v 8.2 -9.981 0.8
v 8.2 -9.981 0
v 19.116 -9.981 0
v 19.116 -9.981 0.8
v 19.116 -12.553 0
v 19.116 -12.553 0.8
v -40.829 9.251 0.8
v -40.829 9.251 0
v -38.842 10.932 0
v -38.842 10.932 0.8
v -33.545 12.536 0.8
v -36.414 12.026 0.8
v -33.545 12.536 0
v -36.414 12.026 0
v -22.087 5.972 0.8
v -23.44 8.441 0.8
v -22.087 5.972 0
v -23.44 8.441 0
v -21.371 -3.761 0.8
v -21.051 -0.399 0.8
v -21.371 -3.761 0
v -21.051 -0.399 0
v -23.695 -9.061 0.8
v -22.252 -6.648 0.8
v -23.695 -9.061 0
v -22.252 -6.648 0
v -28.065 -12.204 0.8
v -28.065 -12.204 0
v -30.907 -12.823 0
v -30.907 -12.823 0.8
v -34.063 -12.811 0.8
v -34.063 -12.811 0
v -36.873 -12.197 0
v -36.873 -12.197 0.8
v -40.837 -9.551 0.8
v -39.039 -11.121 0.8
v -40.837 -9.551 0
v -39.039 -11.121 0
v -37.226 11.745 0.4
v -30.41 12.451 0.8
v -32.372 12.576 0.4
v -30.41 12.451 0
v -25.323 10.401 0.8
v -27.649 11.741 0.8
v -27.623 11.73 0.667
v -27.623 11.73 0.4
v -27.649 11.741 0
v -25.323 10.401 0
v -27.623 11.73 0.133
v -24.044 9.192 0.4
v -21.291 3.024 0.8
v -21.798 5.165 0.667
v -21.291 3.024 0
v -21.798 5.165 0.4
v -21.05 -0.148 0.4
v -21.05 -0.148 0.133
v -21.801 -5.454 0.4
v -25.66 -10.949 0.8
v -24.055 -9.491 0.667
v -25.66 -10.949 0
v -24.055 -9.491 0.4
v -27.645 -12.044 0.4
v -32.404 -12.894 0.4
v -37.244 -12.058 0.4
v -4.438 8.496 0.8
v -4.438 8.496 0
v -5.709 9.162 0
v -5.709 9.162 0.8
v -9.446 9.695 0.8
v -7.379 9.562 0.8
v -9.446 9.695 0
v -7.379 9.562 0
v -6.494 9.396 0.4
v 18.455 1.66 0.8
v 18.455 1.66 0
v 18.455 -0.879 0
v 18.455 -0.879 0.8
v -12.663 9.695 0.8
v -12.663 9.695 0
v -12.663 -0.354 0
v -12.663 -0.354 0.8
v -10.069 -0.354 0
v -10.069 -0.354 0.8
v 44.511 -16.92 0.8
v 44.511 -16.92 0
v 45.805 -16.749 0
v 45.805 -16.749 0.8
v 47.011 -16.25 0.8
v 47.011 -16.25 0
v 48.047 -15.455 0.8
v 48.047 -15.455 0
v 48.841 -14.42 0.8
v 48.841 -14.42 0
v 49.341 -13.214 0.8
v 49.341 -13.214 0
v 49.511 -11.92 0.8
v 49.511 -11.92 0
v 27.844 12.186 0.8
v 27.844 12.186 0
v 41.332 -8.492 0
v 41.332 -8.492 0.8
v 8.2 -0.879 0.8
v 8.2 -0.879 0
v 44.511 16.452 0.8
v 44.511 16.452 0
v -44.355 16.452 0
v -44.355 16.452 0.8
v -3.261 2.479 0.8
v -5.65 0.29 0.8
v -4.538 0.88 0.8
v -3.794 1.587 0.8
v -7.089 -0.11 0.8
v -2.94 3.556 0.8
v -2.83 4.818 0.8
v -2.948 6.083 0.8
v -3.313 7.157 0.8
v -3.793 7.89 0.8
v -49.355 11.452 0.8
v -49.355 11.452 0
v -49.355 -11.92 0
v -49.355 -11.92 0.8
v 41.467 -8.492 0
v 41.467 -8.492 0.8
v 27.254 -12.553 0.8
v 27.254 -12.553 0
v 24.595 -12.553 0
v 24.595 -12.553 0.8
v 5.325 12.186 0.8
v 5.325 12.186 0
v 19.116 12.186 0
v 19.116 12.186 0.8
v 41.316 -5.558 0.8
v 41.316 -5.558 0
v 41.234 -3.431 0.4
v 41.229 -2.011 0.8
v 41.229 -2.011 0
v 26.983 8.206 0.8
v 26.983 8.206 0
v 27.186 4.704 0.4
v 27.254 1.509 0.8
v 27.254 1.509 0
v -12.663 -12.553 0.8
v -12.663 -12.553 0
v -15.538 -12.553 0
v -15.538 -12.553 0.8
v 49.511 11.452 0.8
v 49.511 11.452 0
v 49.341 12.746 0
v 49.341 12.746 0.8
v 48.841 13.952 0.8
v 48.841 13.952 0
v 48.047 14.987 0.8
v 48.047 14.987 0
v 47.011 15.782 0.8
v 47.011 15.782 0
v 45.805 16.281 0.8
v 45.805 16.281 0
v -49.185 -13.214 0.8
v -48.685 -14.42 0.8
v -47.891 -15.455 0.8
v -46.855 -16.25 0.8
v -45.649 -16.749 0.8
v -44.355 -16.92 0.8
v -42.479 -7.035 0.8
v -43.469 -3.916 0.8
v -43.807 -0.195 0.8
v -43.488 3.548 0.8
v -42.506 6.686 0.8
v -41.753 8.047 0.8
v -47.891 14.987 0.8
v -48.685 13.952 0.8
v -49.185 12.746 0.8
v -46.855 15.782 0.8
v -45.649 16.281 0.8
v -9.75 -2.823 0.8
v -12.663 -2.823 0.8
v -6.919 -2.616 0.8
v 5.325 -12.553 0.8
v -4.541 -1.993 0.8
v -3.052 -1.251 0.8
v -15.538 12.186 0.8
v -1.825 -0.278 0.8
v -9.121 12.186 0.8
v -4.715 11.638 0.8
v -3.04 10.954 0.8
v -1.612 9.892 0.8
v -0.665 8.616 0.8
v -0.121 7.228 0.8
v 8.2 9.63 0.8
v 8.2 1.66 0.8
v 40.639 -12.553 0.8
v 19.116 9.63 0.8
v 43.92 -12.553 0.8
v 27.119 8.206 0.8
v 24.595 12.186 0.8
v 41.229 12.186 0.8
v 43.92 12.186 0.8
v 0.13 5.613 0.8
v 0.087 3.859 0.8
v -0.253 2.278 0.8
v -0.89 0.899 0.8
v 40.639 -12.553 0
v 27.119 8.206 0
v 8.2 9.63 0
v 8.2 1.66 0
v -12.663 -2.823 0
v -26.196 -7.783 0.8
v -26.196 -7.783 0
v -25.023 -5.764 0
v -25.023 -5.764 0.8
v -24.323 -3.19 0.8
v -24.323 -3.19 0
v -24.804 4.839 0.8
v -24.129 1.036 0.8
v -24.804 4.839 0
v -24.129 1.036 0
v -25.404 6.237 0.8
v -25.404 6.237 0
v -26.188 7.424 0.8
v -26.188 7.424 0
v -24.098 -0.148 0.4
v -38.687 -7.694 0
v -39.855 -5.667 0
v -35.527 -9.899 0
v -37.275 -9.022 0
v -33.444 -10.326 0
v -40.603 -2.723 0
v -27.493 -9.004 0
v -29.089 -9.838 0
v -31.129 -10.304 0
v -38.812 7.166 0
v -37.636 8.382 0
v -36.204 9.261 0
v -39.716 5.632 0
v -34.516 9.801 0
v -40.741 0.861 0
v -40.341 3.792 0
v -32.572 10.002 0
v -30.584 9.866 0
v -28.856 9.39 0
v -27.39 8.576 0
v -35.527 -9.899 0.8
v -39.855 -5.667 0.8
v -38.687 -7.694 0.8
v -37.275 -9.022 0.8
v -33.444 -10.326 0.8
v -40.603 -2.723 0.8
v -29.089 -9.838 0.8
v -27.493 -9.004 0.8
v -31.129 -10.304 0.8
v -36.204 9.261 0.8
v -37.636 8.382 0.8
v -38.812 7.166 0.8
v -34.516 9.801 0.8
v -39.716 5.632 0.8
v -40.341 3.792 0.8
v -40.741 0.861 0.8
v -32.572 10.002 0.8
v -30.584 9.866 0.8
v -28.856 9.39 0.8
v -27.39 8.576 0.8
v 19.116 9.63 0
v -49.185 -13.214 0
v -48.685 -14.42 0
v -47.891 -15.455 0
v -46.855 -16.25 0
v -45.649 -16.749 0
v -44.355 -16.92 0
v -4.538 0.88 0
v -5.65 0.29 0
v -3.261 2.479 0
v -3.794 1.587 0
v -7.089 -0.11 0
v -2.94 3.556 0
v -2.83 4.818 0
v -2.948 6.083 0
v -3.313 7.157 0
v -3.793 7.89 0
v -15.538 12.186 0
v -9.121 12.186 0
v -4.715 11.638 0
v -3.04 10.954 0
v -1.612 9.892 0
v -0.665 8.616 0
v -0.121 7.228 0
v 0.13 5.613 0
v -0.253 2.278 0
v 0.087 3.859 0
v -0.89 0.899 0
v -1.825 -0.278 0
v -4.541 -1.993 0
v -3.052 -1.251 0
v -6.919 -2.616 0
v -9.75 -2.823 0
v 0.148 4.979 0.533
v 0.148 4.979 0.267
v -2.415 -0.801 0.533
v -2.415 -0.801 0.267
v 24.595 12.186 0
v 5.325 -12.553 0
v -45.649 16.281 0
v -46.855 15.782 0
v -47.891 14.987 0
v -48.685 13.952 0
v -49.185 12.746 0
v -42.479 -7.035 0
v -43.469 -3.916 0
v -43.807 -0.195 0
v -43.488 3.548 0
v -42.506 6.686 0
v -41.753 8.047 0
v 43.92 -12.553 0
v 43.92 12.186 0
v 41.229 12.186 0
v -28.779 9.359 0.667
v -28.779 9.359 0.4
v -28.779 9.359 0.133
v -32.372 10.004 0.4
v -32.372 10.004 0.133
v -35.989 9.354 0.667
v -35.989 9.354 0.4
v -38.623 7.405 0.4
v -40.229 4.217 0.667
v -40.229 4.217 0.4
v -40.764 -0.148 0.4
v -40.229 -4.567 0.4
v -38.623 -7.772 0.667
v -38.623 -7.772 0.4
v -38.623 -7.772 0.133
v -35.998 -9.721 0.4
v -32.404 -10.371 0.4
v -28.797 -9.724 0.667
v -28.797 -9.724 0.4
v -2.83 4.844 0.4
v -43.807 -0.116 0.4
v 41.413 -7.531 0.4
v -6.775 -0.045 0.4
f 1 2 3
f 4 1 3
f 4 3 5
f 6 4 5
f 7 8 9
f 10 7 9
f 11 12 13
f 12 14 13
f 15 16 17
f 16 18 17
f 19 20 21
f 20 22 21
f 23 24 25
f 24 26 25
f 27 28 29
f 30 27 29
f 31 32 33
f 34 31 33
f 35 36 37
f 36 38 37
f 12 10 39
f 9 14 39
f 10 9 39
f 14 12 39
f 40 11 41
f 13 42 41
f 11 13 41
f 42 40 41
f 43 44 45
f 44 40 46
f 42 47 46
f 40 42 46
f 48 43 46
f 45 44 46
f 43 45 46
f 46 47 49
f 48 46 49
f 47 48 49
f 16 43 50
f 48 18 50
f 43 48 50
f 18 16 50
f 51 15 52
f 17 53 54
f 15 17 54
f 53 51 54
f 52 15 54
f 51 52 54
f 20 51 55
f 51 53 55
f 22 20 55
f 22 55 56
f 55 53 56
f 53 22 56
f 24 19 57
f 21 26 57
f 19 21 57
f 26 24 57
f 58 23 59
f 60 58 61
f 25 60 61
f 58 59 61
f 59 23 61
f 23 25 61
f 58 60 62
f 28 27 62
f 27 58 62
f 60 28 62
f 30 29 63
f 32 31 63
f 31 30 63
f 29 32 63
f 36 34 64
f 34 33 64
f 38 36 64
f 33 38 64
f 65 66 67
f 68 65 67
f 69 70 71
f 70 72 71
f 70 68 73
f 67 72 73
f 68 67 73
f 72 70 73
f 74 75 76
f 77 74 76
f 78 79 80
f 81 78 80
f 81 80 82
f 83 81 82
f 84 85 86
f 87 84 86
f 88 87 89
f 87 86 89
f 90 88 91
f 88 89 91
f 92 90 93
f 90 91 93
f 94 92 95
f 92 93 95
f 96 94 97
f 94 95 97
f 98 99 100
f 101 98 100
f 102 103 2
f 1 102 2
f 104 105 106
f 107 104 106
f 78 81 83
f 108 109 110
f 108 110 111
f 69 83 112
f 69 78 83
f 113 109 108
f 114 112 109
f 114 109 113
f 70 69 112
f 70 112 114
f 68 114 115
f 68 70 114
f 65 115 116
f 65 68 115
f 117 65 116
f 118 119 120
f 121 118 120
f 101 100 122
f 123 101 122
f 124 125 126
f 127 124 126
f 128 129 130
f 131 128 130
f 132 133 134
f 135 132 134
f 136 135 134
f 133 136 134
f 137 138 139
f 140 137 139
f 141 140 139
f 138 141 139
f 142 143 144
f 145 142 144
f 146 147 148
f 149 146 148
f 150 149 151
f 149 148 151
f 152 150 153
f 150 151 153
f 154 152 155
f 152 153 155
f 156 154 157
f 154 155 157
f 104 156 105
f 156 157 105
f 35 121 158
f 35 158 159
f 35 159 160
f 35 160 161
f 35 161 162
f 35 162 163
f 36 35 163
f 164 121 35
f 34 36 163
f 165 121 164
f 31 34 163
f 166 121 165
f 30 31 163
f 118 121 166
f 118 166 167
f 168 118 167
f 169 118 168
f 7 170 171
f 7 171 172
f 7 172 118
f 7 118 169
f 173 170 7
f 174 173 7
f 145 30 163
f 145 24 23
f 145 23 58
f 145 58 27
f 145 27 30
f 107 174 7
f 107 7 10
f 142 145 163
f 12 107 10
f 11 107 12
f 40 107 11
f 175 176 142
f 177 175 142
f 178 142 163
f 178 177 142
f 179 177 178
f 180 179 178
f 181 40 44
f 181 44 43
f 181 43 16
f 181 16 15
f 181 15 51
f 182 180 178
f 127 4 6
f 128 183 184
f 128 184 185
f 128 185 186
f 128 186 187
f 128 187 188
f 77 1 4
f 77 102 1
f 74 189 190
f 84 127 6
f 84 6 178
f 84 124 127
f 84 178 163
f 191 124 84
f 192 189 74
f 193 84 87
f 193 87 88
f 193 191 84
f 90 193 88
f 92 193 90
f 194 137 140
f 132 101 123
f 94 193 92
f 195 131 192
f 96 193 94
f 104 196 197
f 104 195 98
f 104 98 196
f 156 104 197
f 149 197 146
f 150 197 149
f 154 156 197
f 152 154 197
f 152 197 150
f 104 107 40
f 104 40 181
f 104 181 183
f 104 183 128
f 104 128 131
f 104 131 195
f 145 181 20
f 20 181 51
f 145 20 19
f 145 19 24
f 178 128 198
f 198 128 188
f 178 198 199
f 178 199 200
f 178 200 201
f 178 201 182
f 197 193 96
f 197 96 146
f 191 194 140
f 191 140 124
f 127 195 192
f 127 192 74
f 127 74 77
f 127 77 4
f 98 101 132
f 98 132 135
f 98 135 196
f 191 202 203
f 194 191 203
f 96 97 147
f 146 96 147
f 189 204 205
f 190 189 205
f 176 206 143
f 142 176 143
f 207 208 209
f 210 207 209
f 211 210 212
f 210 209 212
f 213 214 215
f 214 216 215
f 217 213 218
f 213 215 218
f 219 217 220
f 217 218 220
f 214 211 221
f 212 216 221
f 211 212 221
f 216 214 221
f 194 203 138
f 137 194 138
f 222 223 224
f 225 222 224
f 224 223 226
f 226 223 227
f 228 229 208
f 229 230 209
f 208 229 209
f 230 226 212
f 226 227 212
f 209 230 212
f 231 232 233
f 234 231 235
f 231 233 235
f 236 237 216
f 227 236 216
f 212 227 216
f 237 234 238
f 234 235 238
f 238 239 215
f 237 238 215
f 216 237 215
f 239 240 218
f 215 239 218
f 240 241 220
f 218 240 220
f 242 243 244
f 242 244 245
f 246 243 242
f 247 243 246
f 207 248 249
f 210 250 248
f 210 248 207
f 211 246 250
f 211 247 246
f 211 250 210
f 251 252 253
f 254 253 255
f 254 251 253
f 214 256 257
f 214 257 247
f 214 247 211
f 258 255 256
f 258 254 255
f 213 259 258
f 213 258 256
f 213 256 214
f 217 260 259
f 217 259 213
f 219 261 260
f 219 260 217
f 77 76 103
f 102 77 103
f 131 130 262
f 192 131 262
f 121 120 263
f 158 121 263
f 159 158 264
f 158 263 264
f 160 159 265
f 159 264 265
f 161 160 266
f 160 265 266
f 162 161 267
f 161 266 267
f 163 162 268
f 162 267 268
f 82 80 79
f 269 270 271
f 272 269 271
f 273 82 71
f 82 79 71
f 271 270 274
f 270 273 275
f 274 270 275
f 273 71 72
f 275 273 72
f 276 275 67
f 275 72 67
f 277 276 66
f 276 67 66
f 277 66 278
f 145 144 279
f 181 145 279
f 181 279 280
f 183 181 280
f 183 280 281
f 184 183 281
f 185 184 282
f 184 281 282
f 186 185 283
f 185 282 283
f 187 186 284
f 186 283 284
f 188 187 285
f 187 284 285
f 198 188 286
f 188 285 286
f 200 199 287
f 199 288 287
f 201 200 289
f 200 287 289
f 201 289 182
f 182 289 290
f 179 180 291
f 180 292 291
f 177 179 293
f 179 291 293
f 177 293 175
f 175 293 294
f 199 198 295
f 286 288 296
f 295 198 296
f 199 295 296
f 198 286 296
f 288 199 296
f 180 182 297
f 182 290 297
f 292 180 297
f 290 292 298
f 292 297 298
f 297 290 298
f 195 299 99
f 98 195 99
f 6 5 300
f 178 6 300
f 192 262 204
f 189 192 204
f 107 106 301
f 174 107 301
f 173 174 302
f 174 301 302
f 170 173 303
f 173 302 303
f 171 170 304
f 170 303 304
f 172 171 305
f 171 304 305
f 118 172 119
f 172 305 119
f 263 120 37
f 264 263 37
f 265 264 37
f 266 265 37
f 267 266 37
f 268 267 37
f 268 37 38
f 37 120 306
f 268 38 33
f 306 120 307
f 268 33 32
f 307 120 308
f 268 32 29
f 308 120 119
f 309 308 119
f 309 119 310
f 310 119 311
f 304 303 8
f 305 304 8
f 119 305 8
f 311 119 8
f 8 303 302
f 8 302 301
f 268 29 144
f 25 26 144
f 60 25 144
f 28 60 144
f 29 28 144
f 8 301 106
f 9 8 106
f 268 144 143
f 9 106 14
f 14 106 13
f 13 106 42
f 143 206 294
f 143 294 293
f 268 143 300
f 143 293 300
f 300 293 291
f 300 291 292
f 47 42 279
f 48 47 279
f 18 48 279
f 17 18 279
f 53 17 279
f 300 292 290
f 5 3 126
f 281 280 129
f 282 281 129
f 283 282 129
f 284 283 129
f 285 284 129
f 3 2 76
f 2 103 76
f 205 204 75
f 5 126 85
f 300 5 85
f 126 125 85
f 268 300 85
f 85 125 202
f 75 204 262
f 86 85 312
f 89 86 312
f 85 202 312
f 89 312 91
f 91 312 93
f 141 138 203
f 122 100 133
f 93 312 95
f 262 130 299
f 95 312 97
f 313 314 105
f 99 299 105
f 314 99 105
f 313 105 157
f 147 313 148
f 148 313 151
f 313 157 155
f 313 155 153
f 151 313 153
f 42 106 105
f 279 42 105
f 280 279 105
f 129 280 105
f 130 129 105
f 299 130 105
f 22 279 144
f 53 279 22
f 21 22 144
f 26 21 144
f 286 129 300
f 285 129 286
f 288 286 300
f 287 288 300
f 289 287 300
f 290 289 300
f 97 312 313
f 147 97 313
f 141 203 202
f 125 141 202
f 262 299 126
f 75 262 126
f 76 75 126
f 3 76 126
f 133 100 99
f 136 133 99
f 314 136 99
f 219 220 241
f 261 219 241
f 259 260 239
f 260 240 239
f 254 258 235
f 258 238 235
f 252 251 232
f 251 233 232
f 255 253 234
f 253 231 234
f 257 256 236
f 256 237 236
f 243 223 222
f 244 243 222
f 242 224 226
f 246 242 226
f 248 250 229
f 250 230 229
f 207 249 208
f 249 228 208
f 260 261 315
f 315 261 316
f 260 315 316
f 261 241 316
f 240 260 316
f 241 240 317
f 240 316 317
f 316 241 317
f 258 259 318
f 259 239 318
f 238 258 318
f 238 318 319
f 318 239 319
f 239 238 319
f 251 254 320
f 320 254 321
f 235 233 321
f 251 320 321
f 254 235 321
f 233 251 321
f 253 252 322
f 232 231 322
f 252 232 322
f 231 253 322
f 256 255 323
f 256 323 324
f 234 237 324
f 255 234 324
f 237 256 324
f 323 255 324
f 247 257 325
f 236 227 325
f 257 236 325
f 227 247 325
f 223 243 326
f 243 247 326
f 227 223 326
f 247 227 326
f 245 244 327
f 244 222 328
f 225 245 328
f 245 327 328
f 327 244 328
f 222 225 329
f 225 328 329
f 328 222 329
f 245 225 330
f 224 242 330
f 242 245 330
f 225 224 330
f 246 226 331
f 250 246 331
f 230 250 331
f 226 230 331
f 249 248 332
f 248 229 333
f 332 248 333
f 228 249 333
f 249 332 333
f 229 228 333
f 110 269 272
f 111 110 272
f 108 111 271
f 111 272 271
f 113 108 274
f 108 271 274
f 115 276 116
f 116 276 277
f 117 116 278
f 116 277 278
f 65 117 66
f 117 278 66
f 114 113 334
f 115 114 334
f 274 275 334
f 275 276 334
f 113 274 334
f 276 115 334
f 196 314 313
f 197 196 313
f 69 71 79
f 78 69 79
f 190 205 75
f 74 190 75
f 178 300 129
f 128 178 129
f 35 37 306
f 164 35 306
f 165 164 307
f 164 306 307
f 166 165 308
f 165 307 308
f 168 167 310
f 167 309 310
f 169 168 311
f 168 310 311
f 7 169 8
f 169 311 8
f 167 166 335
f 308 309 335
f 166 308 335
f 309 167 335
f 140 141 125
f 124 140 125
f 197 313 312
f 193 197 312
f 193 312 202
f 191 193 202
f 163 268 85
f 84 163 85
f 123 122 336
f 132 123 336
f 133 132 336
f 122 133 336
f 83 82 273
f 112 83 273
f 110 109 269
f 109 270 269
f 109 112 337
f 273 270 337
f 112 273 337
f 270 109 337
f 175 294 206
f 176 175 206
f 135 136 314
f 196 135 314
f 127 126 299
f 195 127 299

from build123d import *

# Parameters (mm, degrees)
F1_DEPTH = 0.8


with BuildPart() as f1:
    # F0 (on Top) → F1 (new body)
    with BuildSketch(Plane.XY):
        with BuildLine():
            Line((44.5111420751, 16.4517331868), (-44.3552014232, 16.4517331868))
            ThreePointArc((-44.3552014232, 16.4517331868), (-47.8907353291, 14.9872670928), (-49.3552014232, 11.4517331868))
            Line((-49.3552014232, 11.4517331868), (-49.3552014232, -11.9195551425))
            ThreePointArc((-49.3552014232, -11.9195551425), (-47.8907353291, -15.4550890485), (-44.3552014232, -16.9195551425))
            Line((-44.3552014232, -16.9195551425), (44.5111420751, -16.9195551425))
            ThreePointArc((44.5111420751, -16.9195551425), (48.046675981, -15.4550890485), (49.5111420751, -11.9195551425))
            Line((49.5111420751, -11.9195551425), (49.5111420751, 11.4517331868))
            ThreePointArc((49.5111420751, 11.4517331868), (48.046675981, 14.9872670928), (44.5111420751, 16.4517331868))
        make_face()
        with BuildLine():
            add(Edge.make_bspline(
                [(-24.0440908965, 9.1918323241), (-21.04981469, 5.8077046043), (-21.04981469, -0.1483601825)],
                knots=[0, 0, 0, 1, 1, 1], degree=2))
            add(Edge.make_bspline(
                [(-21.04981469, -0.1483601825), (-21.04981469, -6.0881811563), (-24.0549201052, -9.4912599913)],
                knots=[0, 0, 0, 1, 1, 1], degree=2))
            add(Edge.make_bspline(
                [(-24.0549201052, -9.4912599913), (-27.0600255204, -12.8943388263), (-32.4042400154, -12.8943388263)],
                knots=[0, 0, 0, 1, 1, 1], degree=2))
            add(Edge.make_bspline(
                [(-32.4042400154, -12.8943388263), (-37.8675758063, -12.8943388263), (-40.8374862931, -9.5508206392)],
                knots=[0, 0, 0, 1, 1, 1], degree=2))
            add(Edge.make_bspline(
                [(-40.8374862931, -9.5508206392), (-43.80739678, -6.207302452), (-43.80739678, -0.1158725564)],
                knots=[0, 0, 0, 1, 1, 1], degree=2))
            add(Edge.make_bspline(
                [(-43.80739678, -0.1158725564), (-43.80739678, 5.9268259), (-40.8293643866, 9.2513929719)],
                knots=[0, 0, 0, 1, 1, 1], degree=2))
            add(Edge.make_bspline(
                [(-40.8293643866, 9.2513929719), (-37.8513319932, 12.5759600439), (-32.3717523893, 12.5759600439)],
                knots=[0, 0, 0, 1, 1, 1], degree=2))
            add(Edge.make_bspline(
                [(-32.3717523893, 12.5759600439), (-27.038367103, 12.5759600439), (-24.0440908965, 9.1918323241)],
                knots=[0, 0, 0, 1, 1, 1], degree=2))
        make_face(mode=Mode.SUBTRACT)
        with BuildLine():
            add(Edge.make_bspline(
                [(-9.1214413034, 12.1861085305), (0.1483613467, 12.1861085305), (0.1483613467, 4.9792701385)],
                knots=[0, 0, 0, 1, 1, 1], degree=2))
            add(Edge.make_bspline(
                [(0.1483613467, 4.9792701385), (0.1483613467, 1.2215347184), (-2.4154538138, -0.8008200069)],
                knots=[0, 0, 0, 1, 1, 1], degree=2))
            add(Edge.make_bspline(
                [(-2.4154538138, -0.8008200069), (-4.9792689743, -2.8231747322), (-9.7495354081, -2.8231747322)],
                knots=[0, 0, 0, 1, 1, 1], degree=2))
            Line((-9.7495354081, -2.8231747322), (-12.6625925493, -2.8231747322))
            Line((-12.6625925493, -2.8231747322), (-12.6625925493, -12.5532187521))
            Line((-12.6625925493, -12.5532187521), (-15.5377474601, -12.5532187521))
            Line((-15.5377474601, -12.5532187521), (-15.5377474601, 12.1861085305))
            Line((-15.5377474601, 12.1861085305), (-9.1214413034, 12.1861085305))
        make_face(mode=Mode.SUBTRACT)
        Polygon((19.1157203905, -9.9812816851), (19.1157203905, -12.5532187521), (5.3247231068, -12.5532187521), (5.3247231068, 12.1861085305), (19.1157203905, 12.1861085305), (19.1157203905, 9.6304152766), (8.1998780176, 9.6304152766), (8.1998780176, 1.6601176709), (18.4551386596, 1.6601176709), (18.4551386596, -0.87933177), (8.1998780176, -0.87933177), (8.1998780176, -9.9812816851), align=None, mode=Mode.SUBTRACT)
        with BuildLine():
            Line((43.9200229254, 12.1861085305), (43.9200229254, -12.5532187521))
            Line((43.9200229254, -12.5532187521), (40.6387726883, -12.5532187521))
            Line((40.6387726883, -12.5532187521), (27.1185056222, 8.2063743321))
            Line((27.1185056222, 8.2063743321), (26.9831405134, 8.2063743321))
            add(Edge.make_bspline(
                [(26.9831405134, 8.2063743321), (27.253870731, 4.5515163947), (27.253870731, 1.5085087491)],
                knots=[0, 0, 0, 1, 1, 1], degree=2))
            Line((27.253870731, 1.5085087491), (27.253870731, -12.5532187521))
            Line((27.253870731, -12.5532187521), (24.5952999944, -12.5532187521))
            Line((24.5952999944, -12.5532187521), (24.5952999944, 12.1861085305))
            Line((24.5952999944, 12.1861085305), (27.8440626054, 12.1861085305))
            Line((27.8440626054, 12.1861085305), (41.3318420453, -8.4922654884))
            Line((41.3318420453, -8.4922654884), (41.4672071541, -8.4922654884))
            add(Edge.make_bspline(
                [(41.4672071541, -8.4922654884), (41.434719528, -8.0374387229), (41.3155982323, -5.5575499298)],
                knots=[0, 0, 0, 1, 1, 1], degree=2))
            add(Edge.make_bspline(
                [(41.3155982323, -5.5575499298), (41.1964769365, -3.0776611368), (41.2289645626, -2.0109840795)],
                knots=[0, 0, 0, 1, 1, 1], degree=2))
            Line((41.2289645626, -2.0109840795), (41.2289645626, 12.1861085305))
            Line((41.2289645626, 12.1861085305), (43.9200229254, 12.1861085305))
        make_face(mode=Mode.SUBTRACT)
    extrude(amount=F1_DEPTH)


with BuildPart() as f1b:
    # F0 (on Top) → F1, piece 2 (new body)
    with BuildSketch(Plane.XY):
        with BuildLine():
            add(Edge.make_bspline(
                [(-38.6229131133, 7.405012888), (-40.7643891344, 4.8060027992), (-40.7643891344, -0.1483601825)],
                knots=[0, 0, 0, 1, 1, 1], degree=2))
            add(Edge.make_bspline(
                [(-40.7643891344, -0.1483601825), (-40.7643891344, -5.1731130208), (-38.6229131133, -7.7721231096)],
                knots=[0, 0, 0, 1, 1, 1], degree=2))
            add(Edge.make_bspline(
                [(-38.6229131133, -7.7721231096), (-36.4814370922, -10.3711331984), (-32.4042400154, -10.3711331984)],
                knots=[0, 0, 0, 1, 1, 1], degree=2))
            add(Edge.make_bspline(
                [(-32.4042400154, -10.3711331984), (-28.2945553125, -10.3711331984), (-26.1963961263, -7.7829523183)],
                knots=[0, 0, 0, 1, 1, 1], degree=2))
            add(Edge.make_bspline(
                [(-26.1963961263, -7.7829523183), (-24.09823694, -5.1947714383), (-24.09823694, -0.1483601825)],
                knots=[0, 0, 0, 1, 1, 1], degree=2))
            add(Edge.make_bspline(
                [(-24.09823694, -0.1483601825), (-24.09823694, 4.8439050297), (-26.1882742197, 7.4239640033)],
                knots=[0, 0, 0, 1, 1, 1], degree=2))
            add(Edge.make_bspline(
                [(-26.1882742197, 7.4239640033), (-28.2783114995, 10.0040229768), (-32.3717523893, 10.0040229768)],
                knots=[0, 0, 0, 1, 1, 1], degree=2))
            add(Edge.make_bspline(
                [(-32.3717523893, 10.0040229768), (-36.4814370922, 10.0040229768), (-38.6229131133, 7.405012888)],
                knots=[0, 0, 0, 1, 1, 1], degree=2))
        make_face()
    extrude(amount=F1_DEPTH)


with BuildPart() as f1c:
    # F0 (on Top) → F1, piece 3 (new body)
    with BuildSketch(Plane.XY):
        with BuildLine():
            Line((-12.6625925493, 9.6953905288), (-12.6625925493, -0.3541151479))
            Line((-12.6625925493, -0.3541151479), (-10.0689970649, -0.3541151479))
            add(Edge.make_bspline(
                [(-10.0689970649, -0.3541151479), (-6.2462863926, -0.3541151479), (-4.5379787197, 0.8804146443)],
                knots=[0, 0, 0, 1, 1, 1], degree=2))
            add(Edge.make_bspline(
                [(-4.5379787197, 0.8804146443), (-2.8296710467, 2.1149444365), (-2.8296710467, 4.8439050297)],
                knots=[0, 0, 0, 1, 1, 1], degree=2))
            add(Edge.make_bspline(
                [(-2.8296710467, 4.8439050297), (-2.8296710467, 7.296720801), (-4.4378085392, 8.4960556649)],
                knots=[0, 0, 0, 1, 1, 1], degree=2))
            add(Edge.make_bspline(
                [(-4.4378085392, 8.4960556649), (-6.0459460316, 9.6953905288), (-9.4463175645, 9.6953905288)],
                knots=[0, 0, 0, 1, 1, 1], degree=2))
            Line((-9.4463175645, 9.6953905288), (-12.6625925493, 9.6953905288))
        make_face()
    extrude(amount=F1_DEPTH)


solid = Compound([f1.part, f1b.part, f1c.part])
